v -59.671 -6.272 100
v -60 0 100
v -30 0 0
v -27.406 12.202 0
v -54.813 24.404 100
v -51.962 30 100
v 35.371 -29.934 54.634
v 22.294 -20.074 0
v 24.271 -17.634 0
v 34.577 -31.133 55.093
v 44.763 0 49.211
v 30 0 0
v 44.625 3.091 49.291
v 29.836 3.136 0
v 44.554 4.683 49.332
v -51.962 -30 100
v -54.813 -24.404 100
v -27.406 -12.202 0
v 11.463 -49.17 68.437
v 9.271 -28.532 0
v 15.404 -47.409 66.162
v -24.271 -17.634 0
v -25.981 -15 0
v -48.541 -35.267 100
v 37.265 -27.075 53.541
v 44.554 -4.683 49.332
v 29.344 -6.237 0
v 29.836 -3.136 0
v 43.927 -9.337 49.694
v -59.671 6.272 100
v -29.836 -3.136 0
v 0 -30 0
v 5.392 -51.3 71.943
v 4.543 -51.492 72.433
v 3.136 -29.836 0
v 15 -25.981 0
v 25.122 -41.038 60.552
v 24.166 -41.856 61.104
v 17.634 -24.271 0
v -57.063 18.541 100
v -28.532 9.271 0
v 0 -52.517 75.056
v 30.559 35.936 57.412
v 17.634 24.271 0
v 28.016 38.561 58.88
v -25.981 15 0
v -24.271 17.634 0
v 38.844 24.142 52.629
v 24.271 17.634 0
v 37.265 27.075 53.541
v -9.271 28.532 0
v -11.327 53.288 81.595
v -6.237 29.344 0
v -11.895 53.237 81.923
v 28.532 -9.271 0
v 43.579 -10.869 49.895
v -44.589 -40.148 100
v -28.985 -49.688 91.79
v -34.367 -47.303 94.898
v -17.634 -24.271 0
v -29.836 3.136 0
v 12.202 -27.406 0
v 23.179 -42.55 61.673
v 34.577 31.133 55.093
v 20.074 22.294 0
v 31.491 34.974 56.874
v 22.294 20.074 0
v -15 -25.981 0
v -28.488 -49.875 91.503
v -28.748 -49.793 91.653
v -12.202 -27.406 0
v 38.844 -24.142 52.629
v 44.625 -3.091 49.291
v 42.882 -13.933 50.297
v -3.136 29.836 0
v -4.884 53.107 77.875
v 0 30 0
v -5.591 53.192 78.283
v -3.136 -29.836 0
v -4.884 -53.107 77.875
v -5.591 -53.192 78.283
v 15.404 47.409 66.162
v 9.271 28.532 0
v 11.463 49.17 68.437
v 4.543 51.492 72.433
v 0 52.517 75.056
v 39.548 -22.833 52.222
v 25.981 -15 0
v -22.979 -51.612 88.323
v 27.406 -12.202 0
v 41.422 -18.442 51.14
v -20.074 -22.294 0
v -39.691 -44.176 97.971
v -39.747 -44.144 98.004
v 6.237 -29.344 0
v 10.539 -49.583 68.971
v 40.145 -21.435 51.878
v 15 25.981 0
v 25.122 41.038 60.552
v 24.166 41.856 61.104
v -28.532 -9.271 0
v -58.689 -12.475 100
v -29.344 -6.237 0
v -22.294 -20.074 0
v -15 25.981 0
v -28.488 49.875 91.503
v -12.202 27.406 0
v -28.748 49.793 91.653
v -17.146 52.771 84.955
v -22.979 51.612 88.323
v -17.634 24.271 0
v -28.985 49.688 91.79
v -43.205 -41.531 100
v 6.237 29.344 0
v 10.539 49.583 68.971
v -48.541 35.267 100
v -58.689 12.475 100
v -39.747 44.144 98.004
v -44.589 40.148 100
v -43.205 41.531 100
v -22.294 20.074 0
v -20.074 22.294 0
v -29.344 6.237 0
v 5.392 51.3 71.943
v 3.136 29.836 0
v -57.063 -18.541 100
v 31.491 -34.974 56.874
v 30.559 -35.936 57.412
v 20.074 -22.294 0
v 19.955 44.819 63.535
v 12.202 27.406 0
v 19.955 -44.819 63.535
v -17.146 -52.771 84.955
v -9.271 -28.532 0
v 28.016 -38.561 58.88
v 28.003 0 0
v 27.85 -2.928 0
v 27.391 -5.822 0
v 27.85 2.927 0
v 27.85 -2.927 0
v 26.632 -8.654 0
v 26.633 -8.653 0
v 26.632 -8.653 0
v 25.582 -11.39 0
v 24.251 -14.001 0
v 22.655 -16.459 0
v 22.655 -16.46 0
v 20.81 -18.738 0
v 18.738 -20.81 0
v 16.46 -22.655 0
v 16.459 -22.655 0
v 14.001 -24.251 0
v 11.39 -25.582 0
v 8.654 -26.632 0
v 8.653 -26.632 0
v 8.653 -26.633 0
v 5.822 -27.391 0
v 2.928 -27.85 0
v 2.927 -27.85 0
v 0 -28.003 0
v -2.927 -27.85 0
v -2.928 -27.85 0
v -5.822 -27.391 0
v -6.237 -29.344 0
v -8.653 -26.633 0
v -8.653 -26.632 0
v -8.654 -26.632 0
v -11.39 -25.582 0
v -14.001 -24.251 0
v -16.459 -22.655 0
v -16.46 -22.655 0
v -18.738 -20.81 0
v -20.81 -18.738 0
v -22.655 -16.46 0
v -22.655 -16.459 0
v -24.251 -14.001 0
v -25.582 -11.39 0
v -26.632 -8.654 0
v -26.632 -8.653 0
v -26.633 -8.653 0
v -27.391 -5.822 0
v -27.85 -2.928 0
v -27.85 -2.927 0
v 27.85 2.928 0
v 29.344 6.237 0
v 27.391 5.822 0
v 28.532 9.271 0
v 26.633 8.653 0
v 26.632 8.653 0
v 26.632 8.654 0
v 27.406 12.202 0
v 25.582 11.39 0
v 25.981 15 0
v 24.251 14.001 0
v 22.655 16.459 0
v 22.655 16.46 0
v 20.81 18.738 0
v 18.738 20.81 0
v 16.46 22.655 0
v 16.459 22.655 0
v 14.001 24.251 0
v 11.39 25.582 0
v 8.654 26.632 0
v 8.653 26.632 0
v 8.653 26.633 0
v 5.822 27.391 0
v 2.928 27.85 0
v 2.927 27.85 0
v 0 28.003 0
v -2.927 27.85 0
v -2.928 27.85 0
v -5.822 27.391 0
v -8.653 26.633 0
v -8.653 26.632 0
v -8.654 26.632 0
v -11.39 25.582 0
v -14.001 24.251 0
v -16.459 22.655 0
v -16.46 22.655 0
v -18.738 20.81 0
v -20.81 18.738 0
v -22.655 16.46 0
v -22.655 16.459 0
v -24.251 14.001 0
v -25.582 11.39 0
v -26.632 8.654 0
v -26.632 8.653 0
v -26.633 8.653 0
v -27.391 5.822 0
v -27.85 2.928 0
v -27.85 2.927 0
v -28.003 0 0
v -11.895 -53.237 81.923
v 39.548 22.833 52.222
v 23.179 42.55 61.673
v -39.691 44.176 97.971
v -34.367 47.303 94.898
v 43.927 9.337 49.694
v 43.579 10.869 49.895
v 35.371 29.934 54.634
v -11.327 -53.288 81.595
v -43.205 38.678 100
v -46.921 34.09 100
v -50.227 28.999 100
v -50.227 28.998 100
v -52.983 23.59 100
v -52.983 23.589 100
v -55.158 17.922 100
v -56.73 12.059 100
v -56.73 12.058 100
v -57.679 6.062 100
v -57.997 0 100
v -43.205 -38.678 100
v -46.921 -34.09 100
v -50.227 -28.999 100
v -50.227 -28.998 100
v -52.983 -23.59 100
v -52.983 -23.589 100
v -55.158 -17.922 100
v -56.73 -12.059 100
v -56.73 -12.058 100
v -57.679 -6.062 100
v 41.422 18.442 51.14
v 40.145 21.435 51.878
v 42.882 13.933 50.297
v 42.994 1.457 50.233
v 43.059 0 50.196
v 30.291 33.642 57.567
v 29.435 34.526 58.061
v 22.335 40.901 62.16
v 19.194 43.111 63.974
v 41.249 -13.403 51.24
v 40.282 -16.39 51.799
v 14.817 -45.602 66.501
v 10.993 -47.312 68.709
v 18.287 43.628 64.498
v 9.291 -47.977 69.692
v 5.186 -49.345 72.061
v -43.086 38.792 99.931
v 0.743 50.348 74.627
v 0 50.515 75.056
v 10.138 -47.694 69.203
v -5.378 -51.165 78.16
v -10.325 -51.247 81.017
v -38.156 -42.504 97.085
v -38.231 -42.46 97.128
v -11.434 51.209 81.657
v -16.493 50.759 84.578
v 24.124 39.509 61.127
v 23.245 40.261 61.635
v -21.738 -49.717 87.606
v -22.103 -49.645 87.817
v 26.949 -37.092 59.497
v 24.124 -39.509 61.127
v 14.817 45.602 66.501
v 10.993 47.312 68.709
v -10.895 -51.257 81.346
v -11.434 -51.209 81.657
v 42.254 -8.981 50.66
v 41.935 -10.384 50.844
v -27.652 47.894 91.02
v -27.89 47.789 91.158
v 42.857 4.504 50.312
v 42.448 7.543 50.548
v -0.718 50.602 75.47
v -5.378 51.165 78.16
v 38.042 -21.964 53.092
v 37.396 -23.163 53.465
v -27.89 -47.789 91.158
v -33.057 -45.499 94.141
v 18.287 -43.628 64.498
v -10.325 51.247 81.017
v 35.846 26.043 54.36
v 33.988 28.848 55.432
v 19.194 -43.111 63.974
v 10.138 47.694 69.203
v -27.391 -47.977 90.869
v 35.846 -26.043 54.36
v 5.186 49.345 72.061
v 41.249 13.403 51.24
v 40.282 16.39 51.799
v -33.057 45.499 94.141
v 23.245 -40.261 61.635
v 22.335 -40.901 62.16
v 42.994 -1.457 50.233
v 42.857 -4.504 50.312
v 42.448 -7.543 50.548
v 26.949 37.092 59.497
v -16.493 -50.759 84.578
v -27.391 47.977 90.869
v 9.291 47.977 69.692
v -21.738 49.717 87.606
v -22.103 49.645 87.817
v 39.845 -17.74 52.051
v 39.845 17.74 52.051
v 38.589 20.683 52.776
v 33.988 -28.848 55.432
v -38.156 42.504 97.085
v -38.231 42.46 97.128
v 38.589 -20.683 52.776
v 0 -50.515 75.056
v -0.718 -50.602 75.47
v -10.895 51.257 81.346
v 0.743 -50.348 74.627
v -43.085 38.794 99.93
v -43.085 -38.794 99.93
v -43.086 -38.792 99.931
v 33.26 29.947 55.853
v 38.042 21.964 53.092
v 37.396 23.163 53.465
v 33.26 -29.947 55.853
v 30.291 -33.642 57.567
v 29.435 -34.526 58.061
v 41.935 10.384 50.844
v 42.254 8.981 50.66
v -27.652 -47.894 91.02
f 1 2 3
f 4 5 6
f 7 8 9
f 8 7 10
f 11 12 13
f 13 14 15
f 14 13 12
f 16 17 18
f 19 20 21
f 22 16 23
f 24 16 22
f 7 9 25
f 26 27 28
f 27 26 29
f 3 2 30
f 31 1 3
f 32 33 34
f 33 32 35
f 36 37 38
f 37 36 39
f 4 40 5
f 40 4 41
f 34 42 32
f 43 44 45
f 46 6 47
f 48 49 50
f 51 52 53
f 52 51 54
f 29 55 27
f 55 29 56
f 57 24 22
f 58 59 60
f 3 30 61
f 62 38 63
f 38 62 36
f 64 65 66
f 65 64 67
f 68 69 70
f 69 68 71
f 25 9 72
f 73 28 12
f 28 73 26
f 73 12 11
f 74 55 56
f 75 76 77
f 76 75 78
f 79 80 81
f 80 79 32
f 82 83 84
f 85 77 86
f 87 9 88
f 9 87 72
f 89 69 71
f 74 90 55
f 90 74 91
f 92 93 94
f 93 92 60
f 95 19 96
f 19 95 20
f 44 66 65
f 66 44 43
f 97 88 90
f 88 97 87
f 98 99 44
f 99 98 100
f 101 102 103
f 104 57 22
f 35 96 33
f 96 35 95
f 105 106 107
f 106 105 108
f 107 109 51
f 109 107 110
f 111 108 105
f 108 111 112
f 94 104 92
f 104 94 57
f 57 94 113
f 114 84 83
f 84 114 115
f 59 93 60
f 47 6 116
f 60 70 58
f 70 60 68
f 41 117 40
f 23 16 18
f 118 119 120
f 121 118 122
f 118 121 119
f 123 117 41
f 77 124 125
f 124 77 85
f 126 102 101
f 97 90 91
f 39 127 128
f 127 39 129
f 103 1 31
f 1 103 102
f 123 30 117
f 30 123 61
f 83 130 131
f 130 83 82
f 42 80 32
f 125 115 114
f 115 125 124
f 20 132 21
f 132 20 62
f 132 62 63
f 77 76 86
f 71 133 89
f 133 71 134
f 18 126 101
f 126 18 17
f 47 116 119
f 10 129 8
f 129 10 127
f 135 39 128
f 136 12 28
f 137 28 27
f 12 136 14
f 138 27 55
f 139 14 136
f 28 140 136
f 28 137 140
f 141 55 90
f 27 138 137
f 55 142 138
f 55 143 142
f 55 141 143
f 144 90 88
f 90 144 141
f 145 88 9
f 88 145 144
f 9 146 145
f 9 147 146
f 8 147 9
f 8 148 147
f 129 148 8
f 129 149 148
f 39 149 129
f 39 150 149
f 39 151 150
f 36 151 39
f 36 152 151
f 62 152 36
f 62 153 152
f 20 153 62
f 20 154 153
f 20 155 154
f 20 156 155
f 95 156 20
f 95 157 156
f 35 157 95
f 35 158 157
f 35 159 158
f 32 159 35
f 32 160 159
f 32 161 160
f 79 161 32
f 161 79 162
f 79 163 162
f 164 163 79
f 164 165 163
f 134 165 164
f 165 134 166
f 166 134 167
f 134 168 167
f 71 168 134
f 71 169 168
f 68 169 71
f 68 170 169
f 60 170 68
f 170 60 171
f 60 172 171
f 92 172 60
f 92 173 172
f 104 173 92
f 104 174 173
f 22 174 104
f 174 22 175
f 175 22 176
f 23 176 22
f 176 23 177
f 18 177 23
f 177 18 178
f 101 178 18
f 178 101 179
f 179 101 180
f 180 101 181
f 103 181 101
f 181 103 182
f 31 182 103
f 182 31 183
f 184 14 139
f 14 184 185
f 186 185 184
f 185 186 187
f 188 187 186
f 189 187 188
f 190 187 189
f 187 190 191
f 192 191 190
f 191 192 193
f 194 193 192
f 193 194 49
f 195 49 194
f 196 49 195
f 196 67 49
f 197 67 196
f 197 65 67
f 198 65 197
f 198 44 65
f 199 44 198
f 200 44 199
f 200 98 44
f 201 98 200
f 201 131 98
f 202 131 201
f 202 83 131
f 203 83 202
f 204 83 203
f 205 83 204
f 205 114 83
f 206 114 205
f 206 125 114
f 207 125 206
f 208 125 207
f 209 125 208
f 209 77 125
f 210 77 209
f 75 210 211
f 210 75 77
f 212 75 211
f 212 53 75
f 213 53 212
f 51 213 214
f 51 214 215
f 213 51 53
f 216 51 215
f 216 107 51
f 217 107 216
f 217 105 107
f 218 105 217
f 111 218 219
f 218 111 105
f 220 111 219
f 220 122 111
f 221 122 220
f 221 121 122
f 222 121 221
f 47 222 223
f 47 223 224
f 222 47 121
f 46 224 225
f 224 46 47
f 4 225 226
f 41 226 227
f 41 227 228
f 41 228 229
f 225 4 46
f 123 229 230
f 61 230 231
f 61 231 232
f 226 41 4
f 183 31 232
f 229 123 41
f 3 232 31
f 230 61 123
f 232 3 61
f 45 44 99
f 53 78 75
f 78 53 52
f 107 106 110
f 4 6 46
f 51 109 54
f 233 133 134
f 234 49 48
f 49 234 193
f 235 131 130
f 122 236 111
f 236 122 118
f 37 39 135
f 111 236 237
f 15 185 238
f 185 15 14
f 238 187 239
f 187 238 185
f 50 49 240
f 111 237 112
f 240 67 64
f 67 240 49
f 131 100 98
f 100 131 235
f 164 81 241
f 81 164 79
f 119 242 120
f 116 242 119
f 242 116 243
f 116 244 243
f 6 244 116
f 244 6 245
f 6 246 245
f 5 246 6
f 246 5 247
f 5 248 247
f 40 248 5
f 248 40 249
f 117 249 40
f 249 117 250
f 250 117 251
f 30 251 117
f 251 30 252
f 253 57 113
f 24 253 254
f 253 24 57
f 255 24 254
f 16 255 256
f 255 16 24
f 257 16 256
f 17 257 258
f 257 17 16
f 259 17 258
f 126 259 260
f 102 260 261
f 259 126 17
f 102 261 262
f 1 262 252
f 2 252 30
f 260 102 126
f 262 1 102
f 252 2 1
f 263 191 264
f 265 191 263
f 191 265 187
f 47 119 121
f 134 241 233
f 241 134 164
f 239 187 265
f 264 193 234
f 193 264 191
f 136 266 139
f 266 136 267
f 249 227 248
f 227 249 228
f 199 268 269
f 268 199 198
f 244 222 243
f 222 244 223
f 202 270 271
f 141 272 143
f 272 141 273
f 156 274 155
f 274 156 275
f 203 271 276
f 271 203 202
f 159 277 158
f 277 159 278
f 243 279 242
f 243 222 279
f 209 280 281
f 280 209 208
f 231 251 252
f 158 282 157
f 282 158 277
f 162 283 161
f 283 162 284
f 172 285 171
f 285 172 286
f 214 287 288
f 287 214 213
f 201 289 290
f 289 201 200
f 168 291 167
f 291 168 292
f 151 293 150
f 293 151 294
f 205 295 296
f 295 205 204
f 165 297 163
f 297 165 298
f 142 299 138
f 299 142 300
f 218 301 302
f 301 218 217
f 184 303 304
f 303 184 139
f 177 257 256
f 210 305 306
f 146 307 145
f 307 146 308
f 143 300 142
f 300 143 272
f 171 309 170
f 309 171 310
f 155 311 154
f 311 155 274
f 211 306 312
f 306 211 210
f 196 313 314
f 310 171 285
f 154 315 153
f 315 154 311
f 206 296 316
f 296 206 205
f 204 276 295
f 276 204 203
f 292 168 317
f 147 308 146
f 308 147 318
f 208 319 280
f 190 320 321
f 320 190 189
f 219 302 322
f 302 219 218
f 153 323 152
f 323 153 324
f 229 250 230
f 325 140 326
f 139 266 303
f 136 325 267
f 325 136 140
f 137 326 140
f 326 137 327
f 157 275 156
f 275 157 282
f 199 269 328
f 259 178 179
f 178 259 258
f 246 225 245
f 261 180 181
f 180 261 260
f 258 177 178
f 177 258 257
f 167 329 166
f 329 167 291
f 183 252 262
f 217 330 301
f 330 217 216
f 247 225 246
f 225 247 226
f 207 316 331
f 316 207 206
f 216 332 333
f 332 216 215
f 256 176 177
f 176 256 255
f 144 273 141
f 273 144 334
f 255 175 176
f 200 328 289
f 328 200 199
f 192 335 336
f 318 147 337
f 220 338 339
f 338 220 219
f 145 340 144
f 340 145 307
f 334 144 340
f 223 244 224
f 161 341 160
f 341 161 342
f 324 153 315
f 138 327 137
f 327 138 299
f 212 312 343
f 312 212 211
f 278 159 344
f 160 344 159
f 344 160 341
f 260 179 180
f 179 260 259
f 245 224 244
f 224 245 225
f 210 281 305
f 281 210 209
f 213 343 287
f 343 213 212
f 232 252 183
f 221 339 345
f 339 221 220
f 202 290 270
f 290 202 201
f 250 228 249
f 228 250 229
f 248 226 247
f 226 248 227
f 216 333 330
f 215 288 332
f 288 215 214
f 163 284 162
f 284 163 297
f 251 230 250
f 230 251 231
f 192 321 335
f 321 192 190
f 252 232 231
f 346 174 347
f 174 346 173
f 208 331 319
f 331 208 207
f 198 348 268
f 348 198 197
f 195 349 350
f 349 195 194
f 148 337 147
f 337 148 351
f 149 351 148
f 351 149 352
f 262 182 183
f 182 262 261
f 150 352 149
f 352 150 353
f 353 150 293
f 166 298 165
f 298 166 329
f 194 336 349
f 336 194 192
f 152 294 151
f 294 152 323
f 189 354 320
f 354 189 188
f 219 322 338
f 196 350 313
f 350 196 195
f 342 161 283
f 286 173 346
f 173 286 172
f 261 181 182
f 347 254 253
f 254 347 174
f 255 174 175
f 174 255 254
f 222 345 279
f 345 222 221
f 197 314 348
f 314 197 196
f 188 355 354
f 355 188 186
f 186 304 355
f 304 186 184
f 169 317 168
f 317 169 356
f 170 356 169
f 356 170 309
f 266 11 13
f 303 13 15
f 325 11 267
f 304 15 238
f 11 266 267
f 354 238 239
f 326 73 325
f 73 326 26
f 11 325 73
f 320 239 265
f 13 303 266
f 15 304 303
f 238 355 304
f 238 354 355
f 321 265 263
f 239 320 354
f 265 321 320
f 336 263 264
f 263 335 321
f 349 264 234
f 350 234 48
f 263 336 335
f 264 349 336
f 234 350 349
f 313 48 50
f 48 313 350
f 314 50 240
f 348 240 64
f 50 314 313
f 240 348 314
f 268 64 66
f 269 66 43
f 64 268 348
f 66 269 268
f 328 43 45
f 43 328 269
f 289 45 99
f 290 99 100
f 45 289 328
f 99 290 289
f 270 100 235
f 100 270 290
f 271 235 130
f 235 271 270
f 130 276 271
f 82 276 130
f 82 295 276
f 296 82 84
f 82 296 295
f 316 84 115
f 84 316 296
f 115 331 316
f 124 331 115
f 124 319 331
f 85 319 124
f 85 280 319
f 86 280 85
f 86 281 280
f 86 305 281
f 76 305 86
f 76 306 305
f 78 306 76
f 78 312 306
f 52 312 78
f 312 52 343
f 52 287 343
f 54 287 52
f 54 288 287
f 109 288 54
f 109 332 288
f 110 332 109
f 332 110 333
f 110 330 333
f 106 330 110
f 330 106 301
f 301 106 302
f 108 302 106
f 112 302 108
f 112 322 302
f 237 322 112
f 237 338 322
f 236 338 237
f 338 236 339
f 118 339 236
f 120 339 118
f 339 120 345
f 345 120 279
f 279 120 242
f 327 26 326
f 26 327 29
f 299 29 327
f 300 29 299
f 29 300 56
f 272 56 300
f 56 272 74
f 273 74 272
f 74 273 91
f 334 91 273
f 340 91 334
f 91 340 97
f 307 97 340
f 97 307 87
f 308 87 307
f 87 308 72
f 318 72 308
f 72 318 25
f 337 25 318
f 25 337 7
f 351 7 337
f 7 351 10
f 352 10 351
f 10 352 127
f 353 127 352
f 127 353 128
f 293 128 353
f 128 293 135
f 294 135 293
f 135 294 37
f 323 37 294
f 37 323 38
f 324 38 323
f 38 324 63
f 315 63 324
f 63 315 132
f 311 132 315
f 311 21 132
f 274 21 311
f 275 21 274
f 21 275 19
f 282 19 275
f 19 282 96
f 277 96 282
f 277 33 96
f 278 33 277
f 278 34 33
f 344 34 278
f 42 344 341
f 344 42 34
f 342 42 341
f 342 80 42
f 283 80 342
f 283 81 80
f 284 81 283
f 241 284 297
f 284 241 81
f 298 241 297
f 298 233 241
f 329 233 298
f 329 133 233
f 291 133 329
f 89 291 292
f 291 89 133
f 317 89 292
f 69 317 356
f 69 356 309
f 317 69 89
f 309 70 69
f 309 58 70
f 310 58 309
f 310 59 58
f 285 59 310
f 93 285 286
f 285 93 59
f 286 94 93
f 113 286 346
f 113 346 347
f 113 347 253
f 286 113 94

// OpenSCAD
include <../libs/pw_primitives.scad>;

$fn=60;
intersection() {
    hollow_cone_rt(100, 30, 60, 2);
    rotate([0, 30, 0]) translate([-110, -75, -25])
        cube([150, 150, 90]);
}
